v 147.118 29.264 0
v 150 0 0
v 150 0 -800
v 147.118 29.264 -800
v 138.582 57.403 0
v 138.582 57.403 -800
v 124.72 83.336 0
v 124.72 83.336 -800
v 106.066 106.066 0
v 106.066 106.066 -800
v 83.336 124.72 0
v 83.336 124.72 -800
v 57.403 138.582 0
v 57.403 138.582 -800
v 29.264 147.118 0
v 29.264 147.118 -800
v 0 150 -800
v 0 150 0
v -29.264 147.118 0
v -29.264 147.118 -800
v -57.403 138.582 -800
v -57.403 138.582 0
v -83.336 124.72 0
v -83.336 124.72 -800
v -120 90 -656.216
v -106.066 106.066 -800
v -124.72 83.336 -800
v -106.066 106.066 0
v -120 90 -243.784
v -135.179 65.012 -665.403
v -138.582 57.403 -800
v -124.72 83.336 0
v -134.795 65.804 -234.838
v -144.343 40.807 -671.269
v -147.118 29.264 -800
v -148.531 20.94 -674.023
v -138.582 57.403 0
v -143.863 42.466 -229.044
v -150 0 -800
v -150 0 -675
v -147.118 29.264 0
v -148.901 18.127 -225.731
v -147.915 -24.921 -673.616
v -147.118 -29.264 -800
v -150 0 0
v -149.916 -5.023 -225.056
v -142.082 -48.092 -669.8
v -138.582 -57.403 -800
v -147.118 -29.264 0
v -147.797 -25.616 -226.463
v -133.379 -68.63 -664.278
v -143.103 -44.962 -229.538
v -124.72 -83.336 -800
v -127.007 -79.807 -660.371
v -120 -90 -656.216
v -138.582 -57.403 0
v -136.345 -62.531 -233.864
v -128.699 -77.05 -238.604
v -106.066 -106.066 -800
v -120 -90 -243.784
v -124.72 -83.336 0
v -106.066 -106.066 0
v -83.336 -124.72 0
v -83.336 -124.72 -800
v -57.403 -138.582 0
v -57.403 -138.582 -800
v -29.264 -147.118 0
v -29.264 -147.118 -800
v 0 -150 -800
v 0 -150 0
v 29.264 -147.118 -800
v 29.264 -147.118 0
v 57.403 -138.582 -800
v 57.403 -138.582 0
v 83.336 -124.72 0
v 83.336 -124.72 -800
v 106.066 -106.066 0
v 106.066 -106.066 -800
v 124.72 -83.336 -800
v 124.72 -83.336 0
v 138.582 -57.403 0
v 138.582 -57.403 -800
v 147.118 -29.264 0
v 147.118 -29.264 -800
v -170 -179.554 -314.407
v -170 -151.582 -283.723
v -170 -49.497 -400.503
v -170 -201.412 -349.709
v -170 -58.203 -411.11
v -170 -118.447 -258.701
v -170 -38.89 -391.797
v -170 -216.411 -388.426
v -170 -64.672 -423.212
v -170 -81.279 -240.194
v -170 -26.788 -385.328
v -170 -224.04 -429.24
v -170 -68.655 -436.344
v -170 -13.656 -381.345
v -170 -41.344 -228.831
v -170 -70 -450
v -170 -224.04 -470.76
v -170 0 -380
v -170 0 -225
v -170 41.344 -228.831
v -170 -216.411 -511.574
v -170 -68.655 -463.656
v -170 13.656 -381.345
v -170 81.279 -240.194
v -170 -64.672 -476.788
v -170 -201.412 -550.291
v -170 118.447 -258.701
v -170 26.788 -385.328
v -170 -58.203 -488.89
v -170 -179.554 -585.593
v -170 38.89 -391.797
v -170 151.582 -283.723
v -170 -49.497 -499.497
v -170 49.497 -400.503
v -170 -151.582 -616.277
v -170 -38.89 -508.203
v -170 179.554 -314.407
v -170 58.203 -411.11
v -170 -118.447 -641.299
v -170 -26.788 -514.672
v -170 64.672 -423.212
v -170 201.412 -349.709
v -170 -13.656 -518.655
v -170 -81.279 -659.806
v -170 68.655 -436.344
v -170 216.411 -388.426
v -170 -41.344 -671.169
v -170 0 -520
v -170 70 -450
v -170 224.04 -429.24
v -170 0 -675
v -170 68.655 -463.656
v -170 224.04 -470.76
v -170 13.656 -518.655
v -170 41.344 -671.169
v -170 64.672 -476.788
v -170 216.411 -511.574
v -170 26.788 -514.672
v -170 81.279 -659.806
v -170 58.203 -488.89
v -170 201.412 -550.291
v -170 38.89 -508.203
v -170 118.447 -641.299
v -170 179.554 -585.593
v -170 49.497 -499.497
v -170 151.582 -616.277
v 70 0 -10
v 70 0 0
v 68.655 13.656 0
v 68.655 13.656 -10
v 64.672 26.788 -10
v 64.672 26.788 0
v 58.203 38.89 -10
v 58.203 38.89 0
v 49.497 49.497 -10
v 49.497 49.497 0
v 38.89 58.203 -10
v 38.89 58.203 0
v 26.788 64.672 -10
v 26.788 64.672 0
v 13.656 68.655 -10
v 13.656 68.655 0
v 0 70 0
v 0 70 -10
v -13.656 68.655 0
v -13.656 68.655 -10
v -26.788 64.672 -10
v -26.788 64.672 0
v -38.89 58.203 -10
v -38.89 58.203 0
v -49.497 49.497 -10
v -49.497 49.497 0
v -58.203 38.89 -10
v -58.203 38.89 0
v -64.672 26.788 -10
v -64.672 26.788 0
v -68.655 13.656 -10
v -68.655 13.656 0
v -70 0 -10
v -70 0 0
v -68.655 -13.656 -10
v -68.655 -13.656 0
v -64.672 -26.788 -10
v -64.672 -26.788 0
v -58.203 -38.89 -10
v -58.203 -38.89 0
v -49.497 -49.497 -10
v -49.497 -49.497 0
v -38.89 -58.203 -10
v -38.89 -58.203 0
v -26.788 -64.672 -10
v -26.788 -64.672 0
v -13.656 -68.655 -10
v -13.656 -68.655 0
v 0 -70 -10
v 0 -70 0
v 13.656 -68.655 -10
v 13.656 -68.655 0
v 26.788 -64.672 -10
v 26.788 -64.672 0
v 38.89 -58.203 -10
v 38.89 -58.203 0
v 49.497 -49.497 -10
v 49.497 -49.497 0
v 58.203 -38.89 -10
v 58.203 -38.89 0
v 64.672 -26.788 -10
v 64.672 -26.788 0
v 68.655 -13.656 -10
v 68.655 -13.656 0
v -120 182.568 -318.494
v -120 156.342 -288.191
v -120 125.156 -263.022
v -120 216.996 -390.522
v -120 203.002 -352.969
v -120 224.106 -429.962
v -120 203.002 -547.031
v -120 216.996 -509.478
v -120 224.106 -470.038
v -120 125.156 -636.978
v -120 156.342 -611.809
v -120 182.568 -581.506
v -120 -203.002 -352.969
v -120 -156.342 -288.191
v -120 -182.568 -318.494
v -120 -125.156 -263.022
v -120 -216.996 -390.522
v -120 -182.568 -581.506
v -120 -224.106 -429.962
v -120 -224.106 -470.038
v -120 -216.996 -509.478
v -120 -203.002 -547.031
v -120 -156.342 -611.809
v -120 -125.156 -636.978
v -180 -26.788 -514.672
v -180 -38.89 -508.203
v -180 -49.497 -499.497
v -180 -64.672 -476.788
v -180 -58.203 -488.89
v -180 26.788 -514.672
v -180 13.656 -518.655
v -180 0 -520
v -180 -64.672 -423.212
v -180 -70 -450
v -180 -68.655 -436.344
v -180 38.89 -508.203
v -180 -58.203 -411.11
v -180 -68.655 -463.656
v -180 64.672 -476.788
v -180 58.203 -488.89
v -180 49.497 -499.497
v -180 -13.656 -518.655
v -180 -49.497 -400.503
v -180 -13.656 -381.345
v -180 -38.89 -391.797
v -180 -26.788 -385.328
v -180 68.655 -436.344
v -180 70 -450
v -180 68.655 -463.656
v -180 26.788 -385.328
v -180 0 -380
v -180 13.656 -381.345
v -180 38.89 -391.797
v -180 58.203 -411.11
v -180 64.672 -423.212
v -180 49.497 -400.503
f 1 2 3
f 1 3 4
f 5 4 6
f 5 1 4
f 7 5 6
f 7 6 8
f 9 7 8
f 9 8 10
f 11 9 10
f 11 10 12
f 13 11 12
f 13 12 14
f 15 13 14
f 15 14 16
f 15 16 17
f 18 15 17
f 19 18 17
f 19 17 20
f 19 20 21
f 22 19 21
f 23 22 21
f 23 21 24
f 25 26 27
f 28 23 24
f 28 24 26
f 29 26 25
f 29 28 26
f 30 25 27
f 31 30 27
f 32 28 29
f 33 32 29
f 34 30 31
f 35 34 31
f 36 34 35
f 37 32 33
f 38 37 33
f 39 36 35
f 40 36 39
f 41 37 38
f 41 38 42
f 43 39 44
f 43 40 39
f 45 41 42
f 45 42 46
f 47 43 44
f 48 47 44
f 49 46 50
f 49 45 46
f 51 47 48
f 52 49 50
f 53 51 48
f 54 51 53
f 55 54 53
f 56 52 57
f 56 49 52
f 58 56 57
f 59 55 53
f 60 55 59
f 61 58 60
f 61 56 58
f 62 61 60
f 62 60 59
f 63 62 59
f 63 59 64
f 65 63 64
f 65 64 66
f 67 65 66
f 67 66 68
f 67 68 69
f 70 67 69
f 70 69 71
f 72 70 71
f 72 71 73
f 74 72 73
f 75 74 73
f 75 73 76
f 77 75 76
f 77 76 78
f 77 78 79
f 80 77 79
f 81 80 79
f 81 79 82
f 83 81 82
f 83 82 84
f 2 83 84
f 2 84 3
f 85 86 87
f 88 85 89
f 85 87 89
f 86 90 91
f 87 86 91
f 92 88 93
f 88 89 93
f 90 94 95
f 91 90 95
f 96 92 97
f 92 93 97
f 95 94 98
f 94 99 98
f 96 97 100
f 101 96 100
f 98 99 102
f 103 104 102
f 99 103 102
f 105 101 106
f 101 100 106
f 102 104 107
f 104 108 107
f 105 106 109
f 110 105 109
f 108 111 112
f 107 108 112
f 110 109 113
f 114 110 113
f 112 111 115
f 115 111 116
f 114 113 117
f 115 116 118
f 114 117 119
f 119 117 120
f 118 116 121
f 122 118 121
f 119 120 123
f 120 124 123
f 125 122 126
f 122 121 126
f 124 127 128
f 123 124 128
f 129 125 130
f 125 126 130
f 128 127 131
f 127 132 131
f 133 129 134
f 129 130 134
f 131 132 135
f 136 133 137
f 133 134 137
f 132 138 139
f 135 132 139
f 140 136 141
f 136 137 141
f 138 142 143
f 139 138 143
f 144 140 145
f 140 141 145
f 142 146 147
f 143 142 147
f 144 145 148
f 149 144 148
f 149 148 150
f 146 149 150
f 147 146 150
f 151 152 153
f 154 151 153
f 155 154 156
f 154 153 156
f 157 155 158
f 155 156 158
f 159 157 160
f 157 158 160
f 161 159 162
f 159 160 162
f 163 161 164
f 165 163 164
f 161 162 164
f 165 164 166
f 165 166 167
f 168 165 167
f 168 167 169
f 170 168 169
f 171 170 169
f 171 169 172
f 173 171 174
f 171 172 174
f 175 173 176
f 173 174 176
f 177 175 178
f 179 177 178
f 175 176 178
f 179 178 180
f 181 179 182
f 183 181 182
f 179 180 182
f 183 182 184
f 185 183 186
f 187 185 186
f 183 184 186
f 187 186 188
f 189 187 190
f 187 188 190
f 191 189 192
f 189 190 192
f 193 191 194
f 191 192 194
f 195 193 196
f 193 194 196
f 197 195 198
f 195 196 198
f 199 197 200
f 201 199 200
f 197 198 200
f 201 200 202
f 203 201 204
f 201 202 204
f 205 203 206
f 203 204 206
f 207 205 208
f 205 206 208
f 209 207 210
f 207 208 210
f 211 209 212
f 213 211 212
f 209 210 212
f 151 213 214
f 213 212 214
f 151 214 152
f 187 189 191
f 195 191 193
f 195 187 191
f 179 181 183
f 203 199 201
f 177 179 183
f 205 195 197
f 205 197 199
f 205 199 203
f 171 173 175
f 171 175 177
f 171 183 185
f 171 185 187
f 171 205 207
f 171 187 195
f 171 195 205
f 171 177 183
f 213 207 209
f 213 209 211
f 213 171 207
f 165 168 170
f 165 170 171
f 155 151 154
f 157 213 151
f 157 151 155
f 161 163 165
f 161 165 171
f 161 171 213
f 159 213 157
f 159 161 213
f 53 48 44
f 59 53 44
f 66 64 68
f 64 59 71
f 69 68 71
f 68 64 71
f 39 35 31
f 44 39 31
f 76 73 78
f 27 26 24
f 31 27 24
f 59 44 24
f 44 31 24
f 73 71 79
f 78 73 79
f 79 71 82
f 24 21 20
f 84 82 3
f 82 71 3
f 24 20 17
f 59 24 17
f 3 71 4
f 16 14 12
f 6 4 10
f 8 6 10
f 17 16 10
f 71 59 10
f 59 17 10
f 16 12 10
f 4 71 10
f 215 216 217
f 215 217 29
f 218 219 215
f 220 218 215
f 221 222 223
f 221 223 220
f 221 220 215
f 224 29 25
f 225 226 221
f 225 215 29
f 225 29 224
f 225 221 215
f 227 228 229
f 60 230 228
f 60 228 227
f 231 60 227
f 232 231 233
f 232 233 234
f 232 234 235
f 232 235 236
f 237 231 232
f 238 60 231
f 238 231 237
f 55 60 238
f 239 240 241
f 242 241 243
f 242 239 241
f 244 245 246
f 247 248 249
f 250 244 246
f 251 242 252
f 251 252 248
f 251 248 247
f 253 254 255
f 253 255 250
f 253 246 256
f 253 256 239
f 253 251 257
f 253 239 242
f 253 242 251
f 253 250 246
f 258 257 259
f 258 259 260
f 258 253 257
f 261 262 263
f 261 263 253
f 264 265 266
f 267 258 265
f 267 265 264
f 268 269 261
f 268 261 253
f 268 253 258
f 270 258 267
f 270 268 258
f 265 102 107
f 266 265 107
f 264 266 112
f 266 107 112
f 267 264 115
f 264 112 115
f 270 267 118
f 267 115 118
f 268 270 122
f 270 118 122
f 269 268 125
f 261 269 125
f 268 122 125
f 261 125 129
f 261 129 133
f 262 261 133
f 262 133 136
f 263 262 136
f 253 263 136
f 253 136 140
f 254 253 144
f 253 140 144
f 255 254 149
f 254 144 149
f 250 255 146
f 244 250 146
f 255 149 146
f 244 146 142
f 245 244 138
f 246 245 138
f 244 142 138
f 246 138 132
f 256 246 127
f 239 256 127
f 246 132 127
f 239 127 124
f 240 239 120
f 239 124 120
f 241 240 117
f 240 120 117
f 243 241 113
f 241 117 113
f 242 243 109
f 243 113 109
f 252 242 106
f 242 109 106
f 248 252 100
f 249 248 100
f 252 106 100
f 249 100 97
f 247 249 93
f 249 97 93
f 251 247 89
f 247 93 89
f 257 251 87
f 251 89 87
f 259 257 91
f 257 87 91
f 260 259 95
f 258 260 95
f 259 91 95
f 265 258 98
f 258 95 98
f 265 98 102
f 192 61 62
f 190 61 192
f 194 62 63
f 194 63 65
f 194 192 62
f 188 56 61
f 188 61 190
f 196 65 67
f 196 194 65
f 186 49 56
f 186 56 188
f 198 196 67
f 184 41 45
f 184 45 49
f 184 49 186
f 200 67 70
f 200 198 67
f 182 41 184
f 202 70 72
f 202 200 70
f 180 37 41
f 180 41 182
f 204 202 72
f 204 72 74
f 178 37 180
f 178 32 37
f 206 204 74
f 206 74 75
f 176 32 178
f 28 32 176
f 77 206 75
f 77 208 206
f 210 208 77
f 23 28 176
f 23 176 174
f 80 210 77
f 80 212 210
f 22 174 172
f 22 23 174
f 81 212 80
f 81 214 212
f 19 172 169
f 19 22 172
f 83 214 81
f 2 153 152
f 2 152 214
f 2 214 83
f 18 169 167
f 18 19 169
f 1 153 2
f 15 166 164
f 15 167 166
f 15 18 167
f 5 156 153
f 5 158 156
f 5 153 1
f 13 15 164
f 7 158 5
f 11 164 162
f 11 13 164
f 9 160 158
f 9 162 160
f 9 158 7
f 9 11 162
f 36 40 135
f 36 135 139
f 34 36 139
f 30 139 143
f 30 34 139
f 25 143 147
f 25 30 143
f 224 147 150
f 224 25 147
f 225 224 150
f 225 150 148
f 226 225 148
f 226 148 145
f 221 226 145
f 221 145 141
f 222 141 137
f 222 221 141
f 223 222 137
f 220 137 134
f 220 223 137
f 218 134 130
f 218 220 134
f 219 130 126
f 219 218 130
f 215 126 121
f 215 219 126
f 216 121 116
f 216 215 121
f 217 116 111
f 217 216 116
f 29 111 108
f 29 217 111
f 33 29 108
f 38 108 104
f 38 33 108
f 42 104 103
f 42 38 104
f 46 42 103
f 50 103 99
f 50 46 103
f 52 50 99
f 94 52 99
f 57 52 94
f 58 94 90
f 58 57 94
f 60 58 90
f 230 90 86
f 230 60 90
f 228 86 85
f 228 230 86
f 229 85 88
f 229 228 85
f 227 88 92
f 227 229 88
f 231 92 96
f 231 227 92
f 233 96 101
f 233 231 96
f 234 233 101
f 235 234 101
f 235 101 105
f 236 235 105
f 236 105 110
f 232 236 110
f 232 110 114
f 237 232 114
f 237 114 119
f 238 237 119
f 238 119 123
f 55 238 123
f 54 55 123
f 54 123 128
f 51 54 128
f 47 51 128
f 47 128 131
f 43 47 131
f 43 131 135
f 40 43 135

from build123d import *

# Parameters (mm, degrees)
ESQUISSE1_R             = 150
BOSS_EXTRU_1_DEPTH      = 800
ESQUISSE2_R             = 225
BOSS_EXTRU_2_DEPTH      = 50
ESQUISSE4_R             = 70
ENL_V_MAT_EXTRU_2_DEPTH = 10
ESQUISSE3_R             = 70
BOSS_EXTRU_3_DEPTH      = 10


with BuildPart() as part:
    # Esquisse1 → Boss.-Extru.1 (new body)
    with BuildSketch(Plane.XY):
        Circle(ESQUISSE1_R)
    extrude(amount=-BOSS_EXTRU_1_DEPTH)

    # Esquisse2 → Boss.-Extru.2 (add)
    with BuildSketch(Plane(origin=(-120, 0, 0), x_dir=(0, 0, -1), z_dir=(1, 0, 0))):
        with Locations((450, 0)):
            Circle(ESQUISSE2_R)
    extrude(amount=-BOSS_EXTRU_2_DEPTH)

    # Esquisse4 → Enlèv. mat.-Extru.2 (cut)
    with BuildSketch(Plane.XY):
        Circle(ESQUISSE4_R)
    extrude(amount=-ENL_V_MAT_EXTRU_2_DEPTH, mode=Mode.SUBTRACT)

    # Esquisse3 → Boss.-Extru.3 (add)
    with BuildSketch(Plane.ZY.offset(170)):
        with Locations((-450, 0)):
            Circle(ESQUISSE3_R)
    extrude(amount=BOSS_EXTRU_3_DEPTH)


solid = part.part
